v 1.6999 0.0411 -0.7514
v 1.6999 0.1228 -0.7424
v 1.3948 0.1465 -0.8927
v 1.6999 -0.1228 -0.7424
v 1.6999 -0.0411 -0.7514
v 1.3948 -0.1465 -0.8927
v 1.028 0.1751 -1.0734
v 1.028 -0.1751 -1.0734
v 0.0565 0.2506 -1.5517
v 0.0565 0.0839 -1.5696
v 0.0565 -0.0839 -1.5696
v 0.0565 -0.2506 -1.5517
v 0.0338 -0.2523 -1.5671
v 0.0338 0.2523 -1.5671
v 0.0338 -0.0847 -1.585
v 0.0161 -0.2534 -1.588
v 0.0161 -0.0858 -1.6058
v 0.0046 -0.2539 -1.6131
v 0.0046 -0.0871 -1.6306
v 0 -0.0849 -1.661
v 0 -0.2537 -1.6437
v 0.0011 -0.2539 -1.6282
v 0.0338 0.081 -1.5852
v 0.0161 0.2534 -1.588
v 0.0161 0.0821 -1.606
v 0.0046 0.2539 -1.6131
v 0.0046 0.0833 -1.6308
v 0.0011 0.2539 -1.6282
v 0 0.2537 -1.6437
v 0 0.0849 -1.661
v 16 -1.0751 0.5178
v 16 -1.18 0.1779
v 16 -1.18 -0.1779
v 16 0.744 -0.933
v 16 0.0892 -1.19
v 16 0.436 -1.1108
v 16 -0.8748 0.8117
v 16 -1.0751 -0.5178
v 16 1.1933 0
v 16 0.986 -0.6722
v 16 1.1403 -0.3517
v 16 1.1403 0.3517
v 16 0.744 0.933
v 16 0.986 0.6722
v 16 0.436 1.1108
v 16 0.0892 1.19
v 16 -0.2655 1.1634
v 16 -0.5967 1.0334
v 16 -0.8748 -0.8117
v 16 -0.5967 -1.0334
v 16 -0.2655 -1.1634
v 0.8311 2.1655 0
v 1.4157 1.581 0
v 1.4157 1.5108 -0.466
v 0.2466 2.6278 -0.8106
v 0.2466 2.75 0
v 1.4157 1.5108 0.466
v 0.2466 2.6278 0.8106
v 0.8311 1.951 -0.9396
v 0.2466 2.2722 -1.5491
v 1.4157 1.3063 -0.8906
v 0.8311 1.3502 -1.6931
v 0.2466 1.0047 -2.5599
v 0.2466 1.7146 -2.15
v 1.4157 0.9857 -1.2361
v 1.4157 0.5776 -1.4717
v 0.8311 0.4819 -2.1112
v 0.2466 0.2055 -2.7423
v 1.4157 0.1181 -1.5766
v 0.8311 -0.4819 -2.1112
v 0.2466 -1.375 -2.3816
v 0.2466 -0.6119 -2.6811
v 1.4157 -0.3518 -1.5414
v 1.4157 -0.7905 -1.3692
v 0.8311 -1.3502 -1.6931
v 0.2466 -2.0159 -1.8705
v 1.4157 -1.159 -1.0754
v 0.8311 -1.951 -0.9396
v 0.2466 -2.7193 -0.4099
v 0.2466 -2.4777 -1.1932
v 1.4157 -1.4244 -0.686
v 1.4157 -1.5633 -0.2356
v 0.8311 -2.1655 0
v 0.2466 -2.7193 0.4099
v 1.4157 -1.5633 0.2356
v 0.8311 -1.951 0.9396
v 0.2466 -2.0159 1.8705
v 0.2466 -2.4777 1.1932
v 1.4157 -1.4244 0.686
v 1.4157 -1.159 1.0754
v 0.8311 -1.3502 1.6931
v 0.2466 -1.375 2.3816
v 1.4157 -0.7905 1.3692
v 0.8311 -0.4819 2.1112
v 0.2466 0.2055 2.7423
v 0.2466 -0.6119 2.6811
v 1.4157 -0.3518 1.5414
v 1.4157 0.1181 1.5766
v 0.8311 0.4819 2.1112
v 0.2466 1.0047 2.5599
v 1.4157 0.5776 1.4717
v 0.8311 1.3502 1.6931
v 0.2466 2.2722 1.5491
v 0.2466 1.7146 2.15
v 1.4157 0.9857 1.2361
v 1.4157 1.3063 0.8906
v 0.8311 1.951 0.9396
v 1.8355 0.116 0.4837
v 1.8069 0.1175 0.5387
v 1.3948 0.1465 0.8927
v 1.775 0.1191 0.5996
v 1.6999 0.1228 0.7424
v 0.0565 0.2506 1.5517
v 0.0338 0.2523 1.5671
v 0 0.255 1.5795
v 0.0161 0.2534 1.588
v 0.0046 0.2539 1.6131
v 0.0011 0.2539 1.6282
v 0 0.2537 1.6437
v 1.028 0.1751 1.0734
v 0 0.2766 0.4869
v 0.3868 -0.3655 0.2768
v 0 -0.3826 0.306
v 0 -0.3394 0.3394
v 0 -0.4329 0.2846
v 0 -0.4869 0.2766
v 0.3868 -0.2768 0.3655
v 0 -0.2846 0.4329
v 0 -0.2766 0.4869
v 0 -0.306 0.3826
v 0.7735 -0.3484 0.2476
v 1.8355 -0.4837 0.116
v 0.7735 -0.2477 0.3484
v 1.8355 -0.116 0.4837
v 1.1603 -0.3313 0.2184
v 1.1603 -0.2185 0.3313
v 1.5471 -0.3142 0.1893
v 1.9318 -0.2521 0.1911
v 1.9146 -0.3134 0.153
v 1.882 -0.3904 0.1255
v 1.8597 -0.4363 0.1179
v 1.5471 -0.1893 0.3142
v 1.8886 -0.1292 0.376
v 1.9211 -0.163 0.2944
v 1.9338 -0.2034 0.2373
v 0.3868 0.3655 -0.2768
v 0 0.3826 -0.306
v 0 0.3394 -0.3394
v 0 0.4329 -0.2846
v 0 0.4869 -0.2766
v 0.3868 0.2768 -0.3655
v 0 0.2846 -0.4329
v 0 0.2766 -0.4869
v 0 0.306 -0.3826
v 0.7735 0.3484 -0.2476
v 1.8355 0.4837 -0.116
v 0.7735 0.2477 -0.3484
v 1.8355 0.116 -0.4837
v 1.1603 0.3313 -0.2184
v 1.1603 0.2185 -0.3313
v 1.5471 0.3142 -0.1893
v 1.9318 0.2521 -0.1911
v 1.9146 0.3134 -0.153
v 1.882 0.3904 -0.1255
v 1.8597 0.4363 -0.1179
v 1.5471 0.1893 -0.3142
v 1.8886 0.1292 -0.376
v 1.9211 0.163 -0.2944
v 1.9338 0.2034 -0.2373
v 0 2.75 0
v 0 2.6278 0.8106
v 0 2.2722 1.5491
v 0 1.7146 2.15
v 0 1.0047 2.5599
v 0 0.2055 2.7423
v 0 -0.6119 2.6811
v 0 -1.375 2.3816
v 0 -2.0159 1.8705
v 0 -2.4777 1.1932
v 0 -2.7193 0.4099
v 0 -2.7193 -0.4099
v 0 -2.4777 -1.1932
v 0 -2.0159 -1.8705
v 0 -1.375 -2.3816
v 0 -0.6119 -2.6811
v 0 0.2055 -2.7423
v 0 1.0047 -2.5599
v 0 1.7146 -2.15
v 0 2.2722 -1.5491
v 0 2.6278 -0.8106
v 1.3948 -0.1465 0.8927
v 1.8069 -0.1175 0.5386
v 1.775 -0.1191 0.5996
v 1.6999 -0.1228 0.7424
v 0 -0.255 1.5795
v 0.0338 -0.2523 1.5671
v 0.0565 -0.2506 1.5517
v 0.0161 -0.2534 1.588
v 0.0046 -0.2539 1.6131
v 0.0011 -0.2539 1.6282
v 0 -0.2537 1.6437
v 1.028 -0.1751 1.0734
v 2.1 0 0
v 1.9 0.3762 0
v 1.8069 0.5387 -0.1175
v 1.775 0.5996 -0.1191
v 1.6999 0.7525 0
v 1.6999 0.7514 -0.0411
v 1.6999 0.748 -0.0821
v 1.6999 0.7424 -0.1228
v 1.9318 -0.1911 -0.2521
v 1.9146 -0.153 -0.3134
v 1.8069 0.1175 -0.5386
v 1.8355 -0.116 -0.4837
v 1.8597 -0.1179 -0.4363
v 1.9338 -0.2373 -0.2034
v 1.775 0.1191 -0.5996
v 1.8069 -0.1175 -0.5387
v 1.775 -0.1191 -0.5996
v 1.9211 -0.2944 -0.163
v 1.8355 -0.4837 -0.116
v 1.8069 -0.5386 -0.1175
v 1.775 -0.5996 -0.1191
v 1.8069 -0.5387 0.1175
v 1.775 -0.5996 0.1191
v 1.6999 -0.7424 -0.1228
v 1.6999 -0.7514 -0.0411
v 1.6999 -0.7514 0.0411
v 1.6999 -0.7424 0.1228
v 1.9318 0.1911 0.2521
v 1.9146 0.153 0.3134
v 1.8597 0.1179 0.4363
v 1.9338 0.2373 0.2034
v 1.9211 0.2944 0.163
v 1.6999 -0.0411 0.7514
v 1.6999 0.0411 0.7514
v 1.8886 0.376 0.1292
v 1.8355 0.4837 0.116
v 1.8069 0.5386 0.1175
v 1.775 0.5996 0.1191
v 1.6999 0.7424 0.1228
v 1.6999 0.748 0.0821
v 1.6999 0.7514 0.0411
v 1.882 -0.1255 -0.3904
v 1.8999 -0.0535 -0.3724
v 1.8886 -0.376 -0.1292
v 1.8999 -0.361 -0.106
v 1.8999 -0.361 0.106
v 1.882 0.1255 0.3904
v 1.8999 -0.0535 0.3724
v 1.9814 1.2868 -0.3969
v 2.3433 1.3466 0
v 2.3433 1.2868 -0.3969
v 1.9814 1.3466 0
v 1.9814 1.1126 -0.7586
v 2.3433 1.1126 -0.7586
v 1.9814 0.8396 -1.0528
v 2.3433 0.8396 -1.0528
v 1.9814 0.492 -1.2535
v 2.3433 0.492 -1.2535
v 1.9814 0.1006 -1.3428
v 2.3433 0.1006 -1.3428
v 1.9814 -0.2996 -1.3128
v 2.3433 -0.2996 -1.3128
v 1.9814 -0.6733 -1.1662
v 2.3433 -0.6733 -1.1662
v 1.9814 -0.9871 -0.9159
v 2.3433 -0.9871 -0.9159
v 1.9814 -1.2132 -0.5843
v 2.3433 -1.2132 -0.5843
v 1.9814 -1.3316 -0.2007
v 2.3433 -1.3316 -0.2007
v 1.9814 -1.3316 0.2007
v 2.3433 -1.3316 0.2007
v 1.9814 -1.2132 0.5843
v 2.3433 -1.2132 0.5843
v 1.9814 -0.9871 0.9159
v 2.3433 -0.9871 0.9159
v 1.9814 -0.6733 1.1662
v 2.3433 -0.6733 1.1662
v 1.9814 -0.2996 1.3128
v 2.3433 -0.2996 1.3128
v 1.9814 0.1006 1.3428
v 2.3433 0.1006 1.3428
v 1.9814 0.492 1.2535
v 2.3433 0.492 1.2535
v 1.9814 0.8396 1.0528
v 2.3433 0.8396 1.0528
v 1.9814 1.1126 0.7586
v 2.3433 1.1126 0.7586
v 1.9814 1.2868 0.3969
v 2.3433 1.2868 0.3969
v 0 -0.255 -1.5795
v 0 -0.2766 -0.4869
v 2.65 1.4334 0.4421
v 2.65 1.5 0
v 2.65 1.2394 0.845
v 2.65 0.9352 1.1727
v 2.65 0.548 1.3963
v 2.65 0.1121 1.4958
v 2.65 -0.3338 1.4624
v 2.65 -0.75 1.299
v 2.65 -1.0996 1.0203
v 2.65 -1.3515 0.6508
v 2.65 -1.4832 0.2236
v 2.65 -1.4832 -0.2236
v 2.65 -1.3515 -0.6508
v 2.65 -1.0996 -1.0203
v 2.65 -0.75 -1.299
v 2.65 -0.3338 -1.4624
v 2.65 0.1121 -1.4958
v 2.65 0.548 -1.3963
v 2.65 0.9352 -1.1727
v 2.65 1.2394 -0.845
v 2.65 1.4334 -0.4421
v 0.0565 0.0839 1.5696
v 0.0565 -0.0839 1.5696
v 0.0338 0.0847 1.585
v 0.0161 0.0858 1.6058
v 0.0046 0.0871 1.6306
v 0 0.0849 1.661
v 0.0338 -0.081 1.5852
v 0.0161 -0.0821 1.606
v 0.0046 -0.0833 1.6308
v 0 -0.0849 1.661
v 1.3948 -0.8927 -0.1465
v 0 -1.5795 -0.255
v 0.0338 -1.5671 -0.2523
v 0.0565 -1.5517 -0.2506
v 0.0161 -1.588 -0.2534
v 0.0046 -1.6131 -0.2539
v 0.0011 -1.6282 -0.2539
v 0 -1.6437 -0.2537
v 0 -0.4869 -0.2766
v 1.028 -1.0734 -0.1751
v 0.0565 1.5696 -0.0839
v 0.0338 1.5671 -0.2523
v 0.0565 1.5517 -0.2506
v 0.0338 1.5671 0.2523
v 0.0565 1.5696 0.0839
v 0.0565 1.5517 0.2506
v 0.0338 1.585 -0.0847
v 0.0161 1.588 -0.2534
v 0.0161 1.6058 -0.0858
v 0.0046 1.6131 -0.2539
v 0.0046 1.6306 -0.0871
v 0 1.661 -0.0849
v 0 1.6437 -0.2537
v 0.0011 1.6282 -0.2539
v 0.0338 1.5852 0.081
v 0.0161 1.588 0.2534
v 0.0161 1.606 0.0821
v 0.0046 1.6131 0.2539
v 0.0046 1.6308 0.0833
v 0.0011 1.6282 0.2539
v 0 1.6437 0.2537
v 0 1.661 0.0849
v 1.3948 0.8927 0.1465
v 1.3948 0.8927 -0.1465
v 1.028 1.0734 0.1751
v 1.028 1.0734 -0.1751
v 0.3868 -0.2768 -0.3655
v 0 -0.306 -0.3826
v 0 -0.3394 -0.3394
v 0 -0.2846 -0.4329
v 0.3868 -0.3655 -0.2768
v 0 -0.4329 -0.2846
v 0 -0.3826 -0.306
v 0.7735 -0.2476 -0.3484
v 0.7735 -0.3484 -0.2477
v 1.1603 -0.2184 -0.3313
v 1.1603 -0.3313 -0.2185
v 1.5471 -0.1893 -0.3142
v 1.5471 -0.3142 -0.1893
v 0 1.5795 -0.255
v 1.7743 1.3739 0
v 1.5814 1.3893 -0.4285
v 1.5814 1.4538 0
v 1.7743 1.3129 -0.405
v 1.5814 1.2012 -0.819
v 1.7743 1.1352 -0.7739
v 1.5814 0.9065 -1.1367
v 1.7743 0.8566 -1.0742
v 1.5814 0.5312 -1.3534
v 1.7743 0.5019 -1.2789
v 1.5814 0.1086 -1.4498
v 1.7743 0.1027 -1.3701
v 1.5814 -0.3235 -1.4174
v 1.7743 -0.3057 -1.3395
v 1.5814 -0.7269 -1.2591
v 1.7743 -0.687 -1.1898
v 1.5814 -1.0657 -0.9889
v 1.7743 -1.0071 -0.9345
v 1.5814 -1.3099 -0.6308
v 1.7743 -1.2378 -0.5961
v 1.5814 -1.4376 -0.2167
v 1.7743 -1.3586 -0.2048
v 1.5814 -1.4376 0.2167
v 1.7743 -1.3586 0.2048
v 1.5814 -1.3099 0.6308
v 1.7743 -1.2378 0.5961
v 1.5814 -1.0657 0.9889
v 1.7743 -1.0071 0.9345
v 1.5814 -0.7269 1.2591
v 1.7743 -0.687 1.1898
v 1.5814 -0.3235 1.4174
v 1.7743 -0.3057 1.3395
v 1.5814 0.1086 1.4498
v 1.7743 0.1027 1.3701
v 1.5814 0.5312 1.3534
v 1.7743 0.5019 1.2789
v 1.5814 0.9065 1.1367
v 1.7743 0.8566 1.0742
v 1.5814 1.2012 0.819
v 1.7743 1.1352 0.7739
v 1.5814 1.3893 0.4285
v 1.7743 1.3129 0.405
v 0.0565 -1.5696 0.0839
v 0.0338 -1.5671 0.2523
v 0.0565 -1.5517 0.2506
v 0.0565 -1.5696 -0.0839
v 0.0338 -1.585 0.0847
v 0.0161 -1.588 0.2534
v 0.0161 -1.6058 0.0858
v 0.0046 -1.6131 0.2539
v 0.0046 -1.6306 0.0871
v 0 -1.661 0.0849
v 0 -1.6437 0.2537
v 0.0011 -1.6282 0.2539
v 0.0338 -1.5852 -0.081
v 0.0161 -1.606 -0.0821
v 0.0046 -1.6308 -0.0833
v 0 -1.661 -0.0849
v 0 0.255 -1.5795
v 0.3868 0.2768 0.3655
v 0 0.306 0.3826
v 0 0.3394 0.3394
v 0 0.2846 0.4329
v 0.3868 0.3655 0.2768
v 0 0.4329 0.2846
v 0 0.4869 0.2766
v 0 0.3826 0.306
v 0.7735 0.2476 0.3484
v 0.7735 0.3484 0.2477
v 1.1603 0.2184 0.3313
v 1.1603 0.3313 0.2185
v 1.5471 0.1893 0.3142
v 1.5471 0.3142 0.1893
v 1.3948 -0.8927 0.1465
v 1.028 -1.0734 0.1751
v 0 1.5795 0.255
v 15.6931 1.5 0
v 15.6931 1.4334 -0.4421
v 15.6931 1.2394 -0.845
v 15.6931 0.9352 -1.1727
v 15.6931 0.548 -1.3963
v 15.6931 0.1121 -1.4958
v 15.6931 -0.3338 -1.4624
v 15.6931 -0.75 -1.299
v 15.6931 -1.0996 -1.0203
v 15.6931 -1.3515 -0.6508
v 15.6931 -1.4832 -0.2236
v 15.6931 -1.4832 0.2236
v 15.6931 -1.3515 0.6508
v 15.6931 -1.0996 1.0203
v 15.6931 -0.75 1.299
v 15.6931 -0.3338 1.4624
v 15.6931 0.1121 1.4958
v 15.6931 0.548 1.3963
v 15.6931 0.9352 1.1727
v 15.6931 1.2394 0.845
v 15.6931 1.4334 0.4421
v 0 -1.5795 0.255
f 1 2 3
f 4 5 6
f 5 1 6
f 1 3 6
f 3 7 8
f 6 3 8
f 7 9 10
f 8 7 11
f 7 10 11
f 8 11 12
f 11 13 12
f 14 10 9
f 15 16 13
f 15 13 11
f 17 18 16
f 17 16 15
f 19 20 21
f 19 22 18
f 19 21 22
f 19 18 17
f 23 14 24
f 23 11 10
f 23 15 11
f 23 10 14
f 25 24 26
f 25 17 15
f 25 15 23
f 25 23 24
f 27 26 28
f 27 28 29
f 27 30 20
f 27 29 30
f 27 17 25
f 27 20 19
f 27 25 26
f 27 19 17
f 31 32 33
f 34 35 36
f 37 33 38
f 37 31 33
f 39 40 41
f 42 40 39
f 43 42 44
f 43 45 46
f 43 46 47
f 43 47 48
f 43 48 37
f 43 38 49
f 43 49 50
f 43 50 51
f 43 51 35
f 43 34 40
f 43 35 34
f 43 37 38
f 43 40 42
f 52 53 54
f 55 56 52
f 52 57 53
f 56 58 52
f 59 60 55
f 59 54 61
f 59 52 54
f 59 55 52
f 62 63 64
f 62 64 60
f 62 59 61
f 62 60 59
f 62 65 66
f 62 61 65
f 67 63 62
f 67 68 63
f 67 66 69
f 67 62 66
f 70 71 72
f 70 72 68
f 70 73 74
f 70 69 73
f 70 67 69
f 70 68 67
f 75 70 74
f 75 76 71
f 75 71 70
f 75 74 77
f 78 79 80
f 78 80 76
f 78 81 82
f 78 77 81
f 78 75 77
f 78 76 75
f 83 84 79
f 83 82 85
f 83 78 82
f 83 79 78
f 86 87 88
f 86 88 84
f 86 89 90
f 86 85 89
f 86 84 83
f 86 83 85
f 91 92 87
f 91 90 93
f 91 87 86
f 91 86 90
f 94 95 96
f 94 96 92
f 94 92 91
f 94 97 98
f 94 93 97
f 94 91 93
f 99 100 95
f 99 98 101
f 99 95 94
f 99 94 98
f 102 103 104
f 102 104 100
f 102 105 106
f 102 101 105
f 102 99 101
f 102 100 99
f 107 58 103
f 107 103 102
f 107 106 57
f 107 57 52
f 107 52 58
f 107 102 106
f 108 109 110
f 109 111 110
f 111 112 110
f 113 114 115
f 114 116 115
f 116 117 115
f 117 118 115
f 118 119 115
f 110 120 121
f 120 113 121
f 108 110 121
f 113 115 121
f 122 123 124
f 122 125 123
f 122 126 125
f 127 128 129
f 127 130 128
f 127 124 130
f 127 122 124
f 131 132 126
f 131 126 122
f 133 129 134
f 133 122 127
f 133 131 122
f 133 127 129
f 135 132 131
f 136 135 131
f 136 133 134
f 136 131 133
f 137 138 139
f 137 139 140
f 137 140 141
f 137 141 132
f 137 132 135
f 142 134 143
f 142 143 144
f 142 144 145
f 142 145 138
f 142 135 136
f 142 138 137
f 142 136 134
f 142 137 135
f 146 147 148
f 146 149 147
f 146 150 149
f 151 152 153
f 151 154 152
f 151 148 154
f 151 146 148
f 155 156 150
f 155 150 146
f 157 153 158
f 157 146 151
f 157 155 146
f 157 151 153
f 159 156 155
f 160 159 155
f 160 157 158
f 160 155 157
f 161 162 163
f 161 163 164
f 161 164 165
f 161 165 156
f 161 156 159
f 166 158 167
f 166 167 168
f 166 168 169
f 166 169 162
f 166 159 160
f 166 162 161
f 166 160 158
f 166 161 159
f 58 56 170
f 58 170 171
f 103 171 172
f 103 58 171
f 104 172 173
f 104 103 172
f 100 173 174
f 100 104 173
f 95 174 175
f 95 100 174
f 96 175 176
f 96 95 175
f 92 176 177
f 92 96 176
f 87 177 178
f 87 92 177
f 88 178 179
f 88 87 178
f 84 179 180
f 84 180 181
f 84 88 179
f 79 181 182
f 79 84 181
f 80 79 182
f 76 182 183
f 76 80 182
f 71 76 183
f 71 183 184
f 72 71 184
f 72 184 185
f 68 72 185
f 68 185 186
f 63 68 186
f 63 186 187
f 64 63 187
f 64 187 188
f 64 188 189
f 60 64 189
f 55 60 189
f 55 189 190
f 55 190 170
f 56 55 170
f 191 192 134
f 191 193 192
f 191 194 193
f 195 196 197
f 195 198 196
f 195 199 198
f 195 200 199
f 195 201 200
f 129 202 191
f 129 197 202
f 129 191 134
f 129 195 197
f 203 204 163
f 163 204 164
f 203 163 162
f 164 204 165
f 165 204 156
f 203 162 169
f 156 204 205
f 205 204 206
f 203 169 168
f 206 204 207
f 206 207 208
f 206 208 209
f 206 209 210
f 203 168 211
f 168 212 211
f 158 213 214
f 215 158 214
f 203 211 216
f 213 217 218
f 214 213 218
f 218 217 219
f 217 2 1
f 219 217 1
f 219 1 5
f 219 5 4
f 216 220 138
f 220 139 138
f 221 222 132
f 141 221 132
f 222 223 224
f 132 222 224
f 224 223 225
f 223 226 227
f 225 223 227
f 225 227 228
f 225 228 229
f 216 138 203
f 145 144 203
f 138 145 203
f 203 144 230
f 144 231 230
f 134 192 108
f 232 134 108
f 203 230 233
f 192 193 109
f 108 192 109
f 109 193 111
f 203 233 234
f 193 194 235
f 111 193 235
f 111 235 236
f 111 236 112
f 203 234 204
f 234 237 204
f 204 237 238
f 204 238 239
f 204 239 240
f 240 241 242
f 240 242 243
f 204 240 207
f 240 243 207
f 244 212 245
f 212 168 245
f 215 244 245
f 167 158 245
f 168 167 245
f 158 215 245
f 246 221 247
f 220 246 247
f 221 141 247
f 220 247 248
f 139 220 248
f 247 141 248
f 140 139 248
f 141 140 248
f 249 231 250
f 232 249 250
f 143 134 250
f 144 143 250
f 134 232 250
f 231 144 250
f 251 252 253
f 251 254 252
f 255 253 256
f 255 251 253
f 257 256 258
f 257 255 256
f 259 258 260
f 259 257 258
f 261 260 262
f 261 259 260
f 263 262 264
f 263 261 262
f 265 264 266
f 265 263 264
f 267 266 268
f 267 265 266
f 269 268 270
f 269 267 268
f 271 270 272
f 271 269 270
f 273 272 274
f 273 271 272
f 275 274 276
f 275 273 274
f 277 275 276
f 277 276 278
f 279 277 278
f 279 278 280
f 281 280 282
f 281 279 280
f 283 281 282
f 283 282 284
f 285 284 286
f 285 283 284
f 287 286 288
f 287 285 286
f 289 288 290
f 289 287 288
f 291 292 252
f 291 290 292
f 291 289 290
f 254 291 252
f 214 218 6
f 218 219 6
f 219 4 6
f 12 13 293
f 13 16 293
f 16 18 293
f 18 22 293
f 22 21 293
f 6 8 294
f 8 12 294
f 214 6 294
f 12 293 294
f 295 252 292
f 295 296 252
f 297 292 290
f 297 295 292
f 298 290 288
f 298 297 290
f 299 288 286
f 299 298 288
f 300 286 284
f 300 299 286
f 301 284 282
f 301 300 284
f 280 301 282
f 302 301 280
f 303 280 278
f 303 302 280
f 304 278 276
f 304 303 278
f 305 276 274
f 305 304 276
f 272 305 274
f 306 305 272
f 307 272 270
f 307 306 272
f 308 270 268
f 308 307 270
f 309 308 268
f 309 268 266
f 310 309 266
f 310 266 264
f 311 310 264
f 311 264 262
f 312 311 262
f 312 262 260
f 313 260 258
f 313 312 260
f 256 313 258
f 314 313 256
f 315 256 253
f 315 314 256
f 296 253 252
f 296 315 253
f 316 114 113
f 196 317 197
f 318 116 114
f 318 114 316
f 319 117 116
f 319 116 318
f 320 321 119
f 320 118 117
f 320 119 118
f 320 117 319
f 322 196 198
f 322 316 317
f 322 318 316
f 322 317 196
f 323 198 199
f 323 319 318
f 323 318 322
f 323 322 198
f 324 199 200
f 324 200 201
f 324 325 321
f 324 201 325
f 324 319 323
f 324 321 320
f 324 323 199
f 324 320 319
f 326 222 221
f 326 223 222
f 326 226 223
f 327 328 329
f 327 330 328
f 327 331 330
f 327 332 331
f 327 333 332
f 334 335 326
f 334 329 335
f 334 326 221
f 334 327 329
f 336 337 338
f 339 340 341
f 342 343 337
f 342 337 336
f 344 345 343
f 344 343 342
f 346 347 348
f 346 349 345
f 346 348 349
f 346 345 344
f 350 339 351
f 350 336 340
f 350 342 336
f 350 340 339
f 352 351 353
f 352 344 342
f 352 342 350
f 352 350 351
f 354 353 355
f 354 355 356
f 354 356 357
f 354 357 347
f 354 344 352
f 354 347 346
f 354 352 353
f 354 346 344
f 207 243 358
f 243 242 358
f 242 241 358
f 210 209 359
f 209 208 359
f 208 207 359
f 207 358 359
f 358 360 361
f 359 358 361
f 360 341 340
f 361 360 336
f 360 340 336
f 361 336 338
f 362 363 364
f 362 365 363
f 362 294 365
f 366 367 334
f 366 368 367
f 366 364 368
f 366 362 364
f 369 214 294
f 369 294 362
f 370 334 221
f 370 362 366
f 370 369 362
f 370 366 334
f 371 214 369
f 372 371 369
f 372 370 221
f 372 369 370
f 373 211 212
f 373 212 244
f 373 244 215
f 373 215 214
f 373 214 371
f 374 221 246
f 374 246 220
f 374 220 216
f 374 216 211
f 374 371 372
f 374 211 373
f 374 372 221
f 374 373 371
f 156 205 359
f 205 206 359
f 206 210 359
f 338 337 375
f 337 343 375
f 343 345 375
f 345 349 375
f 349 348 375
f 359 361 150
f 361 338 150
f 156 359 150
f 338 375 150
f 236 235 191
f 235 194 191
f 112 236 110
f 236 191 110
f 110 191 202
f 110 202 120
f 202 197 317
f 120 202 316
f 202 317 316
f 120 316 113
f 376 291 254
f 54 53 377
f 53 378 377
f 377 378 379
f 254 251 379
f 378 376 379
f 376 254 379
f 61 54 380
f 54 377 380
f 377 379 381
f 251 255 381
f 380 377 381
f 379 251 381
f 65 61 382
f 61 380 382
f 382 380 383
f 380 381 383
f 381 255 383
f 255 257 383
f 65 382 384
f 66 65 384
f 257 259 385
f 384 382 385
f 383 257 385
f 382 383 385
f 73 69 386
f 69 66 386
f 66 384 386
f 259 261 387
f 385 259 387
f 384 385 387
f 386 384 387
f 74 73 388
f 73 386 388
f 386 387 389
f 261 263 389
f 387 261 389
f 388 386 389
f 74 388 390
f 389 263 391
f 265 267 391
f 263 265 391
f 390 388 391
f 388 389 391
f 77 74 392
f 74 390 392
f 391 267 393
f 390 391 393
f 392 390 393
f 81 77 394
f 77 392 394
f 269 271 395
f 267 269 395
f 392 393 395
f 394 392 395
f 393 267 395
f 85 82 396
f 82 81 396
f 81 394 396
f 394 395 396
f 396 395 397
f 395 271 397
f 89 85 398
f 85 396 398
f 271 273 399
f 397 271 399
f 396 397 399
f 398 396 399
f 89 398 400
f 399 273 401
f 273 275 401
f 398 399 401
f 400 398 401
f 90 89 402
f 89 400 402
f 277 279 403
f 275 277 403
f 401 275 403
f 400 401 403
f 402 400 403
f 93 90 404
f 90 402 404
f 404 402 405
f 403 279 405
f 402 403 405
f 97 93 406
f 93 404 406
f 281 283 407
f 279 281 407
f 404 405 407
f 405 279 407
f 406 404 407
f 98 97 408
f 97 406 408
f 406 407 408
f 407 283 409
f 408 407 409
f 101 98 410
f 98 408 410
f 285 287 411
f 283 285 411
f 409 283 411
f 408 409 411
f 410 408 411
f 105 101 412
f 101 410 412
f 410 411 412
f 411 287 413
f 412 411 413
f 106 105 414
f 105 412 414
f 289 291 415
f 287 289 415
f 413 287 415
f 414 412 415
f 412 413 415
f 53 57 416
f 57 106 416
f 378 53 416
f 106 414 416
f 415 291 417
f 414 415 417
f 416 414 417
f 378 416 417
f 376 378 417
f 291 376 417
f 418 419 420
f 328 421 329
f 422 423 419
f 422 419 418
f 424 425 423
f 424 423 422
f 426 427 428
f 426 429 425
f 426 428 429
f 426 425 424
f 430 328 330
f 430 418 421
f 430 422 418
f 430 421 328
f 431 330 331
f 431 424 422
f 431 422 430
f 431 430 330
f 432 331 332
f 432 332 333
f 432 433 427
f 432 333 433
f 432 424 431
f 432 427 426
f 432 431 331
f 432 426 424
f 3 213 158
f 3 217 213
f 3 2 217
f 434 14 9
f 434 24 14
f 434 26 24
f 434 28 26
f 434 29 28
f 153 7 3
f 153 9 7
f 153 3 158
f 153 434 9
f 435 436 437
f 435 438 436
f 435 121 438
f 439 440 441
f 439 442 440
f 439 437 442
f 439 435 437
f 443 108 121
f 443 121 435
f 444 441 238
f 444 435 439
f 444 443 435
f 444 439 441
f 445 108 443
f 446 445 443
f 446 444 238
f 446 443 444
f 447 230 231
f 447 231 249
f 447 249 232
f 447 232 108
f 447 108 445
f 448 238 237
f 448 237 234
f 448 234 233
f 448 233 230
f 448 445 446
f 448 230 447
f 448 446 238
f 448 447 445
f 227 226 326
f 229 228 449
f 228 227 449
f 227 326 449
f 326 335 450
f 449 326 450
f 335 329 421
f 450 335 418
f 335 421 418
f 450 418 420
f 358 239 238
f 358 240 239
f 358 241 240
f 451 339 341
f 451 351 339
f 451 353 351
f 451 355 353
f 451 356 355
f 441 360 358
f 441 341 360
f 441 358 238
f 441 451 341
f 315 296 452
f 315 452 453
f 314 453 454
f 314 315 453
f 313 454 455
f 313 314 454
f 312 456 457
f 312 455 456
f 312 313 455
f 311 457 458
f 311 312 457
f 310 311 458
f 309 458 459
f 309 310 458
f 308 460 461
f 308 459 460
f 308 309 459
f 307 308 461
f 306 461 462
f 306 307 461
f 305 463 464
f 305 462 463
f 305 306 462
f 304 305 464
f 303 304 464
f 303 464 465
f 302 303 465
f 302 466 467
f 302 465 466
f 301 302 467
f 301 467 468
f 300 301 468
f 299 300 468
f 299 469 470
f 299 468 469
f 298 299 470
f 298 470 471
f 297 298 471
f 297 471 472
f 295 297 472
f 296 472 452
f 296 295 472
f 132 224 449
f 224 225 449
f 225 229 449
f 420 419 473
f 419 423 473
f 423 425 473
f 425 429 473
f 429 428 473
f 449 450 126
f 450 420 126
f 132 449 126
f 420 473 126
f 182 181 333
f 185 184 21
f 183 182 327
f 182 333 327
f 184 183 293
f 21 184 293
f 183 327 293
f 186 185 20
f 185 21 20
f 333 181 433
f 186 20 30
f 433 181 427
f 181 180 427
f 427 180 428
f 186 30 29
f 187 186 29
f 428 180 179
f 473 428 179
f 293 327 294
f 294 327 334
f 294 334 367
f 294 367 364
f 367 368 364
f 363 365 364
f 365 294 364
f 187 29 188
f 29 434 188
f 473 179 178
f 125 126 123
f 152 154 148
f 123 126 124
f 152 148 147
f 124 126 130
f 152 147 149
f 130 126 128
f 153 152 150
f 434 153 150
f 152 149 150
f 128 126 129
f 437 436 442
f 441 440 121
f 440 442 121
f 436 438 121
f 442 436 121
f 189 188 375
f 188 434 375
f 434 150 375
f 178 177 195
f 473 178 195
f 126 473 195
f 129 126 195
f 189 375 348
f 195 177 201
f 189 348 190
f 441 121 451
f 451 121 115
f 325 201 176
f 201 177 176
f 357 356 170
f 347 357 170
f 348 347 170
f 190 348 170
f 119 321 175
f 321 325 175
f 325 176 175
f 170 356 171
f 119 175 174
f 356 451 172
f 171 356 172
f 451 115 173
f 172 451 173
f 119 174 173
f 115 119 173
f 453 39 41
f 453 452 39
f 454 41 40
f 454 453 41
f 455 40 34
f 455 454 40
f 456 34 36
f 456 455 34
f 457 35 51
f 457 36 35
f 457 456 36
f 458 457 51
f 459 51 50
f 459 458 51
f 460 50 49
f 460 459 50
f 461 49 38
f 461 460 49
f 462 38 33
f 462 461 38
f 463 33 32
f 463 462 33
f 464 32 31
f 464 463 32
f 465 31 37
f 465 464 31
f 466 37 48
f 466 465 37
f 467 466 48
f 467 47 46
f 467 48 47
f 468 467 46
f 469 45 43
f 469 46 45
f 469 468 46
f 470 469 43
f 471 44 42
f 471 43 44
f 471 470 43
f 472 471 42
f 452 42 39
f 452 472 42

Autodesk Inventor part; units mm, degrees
ref_plane "YZ Plane" through (0, 0, 0) normal (1, 0, 0) x (0, 1, 0)
ref_plane "XZ Plane" through (0, 0, 0) normal (0, 1, 0) x (-1, 0, 0)
sketch "Sketch1" plane through (0, 0, 0) normal (0, 0, 1) x (1, 0, 0)
  line L0 (2.1, 0) -> (16, 0)
  line L1 (16, 0) -> (16, 1.5)
  line L2 (16, 1.5) -> (2.65, 1.5)
  line L3 (2.65, 1.5) -> (2.3433, 1.3466)
  line L4 (2.3433, 1.3466) -> (1.9814, 1.3466)
  line L5 (0, 2.75) -> (0, 1.6)
  line L6 (0, 1.6) -> (1.6999, 0.7525)
  line L7 (1.6999, 0.7525) -> (2.1, 0)
  line L8 (-3.2, 0) -> (19.2, 0) projected
  line L9 (0, -0.55) -> (0, 3.3) projected
  line L10 (0, 2.75) -> (0.2466, 2.75)
  line L11 (0.2466, 2.75) -> (1.4157, 1.581)
  line L12 (2.65, 1.5) -> (1.4966, 1.5) construction
  arc A0 (1.4157, 1.581) -> (1.9814, 1.3466) centre (1.9814, 2.1466) ccw
  point P0 (1.65, 1.3466)
  dimension "d1" = 13.35
  dimension "d2" = 3
  dimension "d3" = 2.6933
  dimension "d4" = 3.2
  dimension "d5" = 26.5
  dimension "d6" = 62
  dimension "d7" = 2.1
  dimension "d8" = 0.3067
  dimension "d12" = 5.5
  dimension "d13" = 45
  dimension "d15" = 16
  dimension "d24" = 1.65
  dimension "d93" = 0.8
revolve "Body" add sketch "Sketch1" angle 360 about axis through (2.1, 0, 0) along (1, 0, 0) contours L7 L6 L5 L10 L11 A0 L4 L3 L2 L1 L0
sketch "Sketch2" plane through (0, 0, 0) normal (-1, 0, 0) x (0, 0, 1)
  line L0 (0, 1.6) -> (0, 0) construction
  line L1 (0, 0) -> (1.6, 0) construction
  arc A0 (0.48, 0) -> (0, 0.48) centre (0, 0) ccw construction
  arc A1 (0.56, 0) -> (0, 0.56) centre (0, 0) ccw construction
  arc A2 (1.5795, 0.255) -> (0.255, 1.5795) centre (0, 0) ccw
  line L2 (0, 0) -> (1.1314, 1.1314) construction
  line L3 (0.255, 1.5795) -> (0.2766, 0.4869)
  line L4 (1.5795, 0.255) -> (0.4869, 0.2766)
  arc A3 (0.255, 1.5795) -> (0, 1.6) centre (0, 0) ccw
  arc A4 (1.6, 0) -> (1.5795, 0.255) centre (0, 0) ccw
  line L5 (0, -3.85) -> (0, 3.85) projected
  line L6 (-3.85, 0) -> (3.85, 0) projected
  arc A5 (0.255, -1.5795) -> (1.5795, -0.255) centre (0, 0) ccw
  line L7 (0.255, -1.5795) -> (0.2766, -0.4869)
  line L8 (1.5795, -0.255) -> (0.4869, -0.2766)
  arc A6 (0, -1.6) -> (0.255, -1.5795) centre (0, 0) ccw
  arc A7 (1.5795, -0.255) -> (1.6, 0) centre (0, 0) ccw
  arc A8 (-0.255, 1.5795) -> (-1.5795, 0.255) centre (0, 0) ccw
  line L9 (-0.255, 1.5795) -> (-0.2766, 0.4869)
  line L10 (-1.5795, 0.255) -> (-0.4869, 0.2766)
  arc A9 (0, 1.6) -> (-0.255, 1.5795) centre (0, 0) ccw
  arc A10 (-1.5795, 0.255) -> (-1.6, 0) centre (0, 0) ccw
  arc A11 (-0.255, -1.5795) -> (0, -1.6) centre (0, 0) ccw
  arc A12 (-1.5795, -0.255) -> (-0.255, -1.5795) centre (0, 0) ccw
  arc A13 (-1.6, 0) -> (-1.5795, -0.255) centre (0, 0) ccw
  line L11 (-1.5795, -0.255) -> (-0.4869, -0.2766)
  line L12 (-0.255, -1.5795) -> (-0.2766, -0.4869)
  arc A14 (0.2766, 0.4869) -> (0.4869, 0.2766) centre (0.4912, 0.4912) ccw
  arc A15 (0.4869, -0.2766) -> (0.2766, -0.4869) centre (0.4912, -0.4912) ccw
  arc A16 (-0.4869, 0.2766) -> (-0.2766, 0.4869) centre (-0.4912, 0.4912) ccw
  arc A17 (-0.2766, -0.4869) -> (-0.4869, -0.2766) centre (-0.4912, -0.4912) ccw
  point P0 (1.1314, -1.1314)
  point P1 (-1.1314, 1.1314)
  point P2 (-1.1314, -1.1314)
  dimension "d17" = 0.96
  dimension "d18" = 1.12
  dimension "d19" = 3.2
  dimension "d20" = 45
  dimension "d21" = 0.255
extrude "Slot" add sketch "Sketch2" against normal up to next draft 5 contours L4 A14 L3 A2 | A5 L7 A15 L8 | L9 A16 L10 A8 | A12 L11 A17 L12
fillet "Fillet1" radius 0.102 4 edges at (0, 1.6, 0) (0, 0, -1.6) (0, -1.6, 0) (0, 0, 1.6)
thread "Thread" size "M3x0.5" class "6g" standard "ISO Metric profile" length 13.35
chamfer "Chamfer1" distance 0.3067 distance2 0.3069 1 edges at (16, -1.5, 0) measured on face at (16, -0.5495, 0.6466)
ref_plane "Work Plane2" through (3.35, 0, 0) normal (0, 0, -1) x (1, 0, 0)
equation "\"d24\" = KOH"
equation "\"d17\" = 0.3 * SDM"
equation "\"d18\" = 0.35 * SDM"
equation "\"d19\" = SDM"
equation "\"d21\" = 0.5 * SBR"
equation "\"d1\" = GEL"
equation "\"d2\" = GD"
equation "\"d3\" = BDM"
equation "\"d4\" = SDM"
equation "\"d7\" = INTI"
equation "\"d8\" = GAL"
equation "\"d12\" = KOD"
equation "\"d13\" = 0.5 * SEWI"
equation "\"d15\" = NLG"
equation "\"d93\" = R"
equation "\"d23\" = 0.2 * SBR"
equation "\"d10\" = GEL"
equation "\"d25\" = -0.5 * SPD + 0.5 * GD"
equation "\"NLG\" = 16"
equation "\"GEL\" = 13.35"
equation "\"GAL\" = 0.61345 * PTC"
equation "\"SPD\" = NND - 1.2269 * PTC"
equation "\"KOD\" = 5.5"
equation "\"KOH\" = 1.65"
equation "\"SBR\" = 0.51"
equation "\"INTI\" = 2.1"
equation "\"SDM\" = 3.2"
equation "\"GD\" = NND"
equation "\"BDM\" = NND - GAL"
equation "\"SEWI\" = 90deg"
equation "\"d9\" = SDM"
equation "\"R\" = 0.8"
equation "\"GUL\" = 0.61345 * PTC"
equation "\"TOA\" = 30deg"
equation "\"EPV\" = 3.15"
equation "\"THREADDIA\" = 3"
equation "\"PTC\" = 0.5"
equation "\"NND\" = 3"
equation "\"GD1\" = THREADDIA - 1.2269 * PTC"
properties part number "ISO 7046-1  - M3 x 16 - 4.8 - H" material "Steel"
